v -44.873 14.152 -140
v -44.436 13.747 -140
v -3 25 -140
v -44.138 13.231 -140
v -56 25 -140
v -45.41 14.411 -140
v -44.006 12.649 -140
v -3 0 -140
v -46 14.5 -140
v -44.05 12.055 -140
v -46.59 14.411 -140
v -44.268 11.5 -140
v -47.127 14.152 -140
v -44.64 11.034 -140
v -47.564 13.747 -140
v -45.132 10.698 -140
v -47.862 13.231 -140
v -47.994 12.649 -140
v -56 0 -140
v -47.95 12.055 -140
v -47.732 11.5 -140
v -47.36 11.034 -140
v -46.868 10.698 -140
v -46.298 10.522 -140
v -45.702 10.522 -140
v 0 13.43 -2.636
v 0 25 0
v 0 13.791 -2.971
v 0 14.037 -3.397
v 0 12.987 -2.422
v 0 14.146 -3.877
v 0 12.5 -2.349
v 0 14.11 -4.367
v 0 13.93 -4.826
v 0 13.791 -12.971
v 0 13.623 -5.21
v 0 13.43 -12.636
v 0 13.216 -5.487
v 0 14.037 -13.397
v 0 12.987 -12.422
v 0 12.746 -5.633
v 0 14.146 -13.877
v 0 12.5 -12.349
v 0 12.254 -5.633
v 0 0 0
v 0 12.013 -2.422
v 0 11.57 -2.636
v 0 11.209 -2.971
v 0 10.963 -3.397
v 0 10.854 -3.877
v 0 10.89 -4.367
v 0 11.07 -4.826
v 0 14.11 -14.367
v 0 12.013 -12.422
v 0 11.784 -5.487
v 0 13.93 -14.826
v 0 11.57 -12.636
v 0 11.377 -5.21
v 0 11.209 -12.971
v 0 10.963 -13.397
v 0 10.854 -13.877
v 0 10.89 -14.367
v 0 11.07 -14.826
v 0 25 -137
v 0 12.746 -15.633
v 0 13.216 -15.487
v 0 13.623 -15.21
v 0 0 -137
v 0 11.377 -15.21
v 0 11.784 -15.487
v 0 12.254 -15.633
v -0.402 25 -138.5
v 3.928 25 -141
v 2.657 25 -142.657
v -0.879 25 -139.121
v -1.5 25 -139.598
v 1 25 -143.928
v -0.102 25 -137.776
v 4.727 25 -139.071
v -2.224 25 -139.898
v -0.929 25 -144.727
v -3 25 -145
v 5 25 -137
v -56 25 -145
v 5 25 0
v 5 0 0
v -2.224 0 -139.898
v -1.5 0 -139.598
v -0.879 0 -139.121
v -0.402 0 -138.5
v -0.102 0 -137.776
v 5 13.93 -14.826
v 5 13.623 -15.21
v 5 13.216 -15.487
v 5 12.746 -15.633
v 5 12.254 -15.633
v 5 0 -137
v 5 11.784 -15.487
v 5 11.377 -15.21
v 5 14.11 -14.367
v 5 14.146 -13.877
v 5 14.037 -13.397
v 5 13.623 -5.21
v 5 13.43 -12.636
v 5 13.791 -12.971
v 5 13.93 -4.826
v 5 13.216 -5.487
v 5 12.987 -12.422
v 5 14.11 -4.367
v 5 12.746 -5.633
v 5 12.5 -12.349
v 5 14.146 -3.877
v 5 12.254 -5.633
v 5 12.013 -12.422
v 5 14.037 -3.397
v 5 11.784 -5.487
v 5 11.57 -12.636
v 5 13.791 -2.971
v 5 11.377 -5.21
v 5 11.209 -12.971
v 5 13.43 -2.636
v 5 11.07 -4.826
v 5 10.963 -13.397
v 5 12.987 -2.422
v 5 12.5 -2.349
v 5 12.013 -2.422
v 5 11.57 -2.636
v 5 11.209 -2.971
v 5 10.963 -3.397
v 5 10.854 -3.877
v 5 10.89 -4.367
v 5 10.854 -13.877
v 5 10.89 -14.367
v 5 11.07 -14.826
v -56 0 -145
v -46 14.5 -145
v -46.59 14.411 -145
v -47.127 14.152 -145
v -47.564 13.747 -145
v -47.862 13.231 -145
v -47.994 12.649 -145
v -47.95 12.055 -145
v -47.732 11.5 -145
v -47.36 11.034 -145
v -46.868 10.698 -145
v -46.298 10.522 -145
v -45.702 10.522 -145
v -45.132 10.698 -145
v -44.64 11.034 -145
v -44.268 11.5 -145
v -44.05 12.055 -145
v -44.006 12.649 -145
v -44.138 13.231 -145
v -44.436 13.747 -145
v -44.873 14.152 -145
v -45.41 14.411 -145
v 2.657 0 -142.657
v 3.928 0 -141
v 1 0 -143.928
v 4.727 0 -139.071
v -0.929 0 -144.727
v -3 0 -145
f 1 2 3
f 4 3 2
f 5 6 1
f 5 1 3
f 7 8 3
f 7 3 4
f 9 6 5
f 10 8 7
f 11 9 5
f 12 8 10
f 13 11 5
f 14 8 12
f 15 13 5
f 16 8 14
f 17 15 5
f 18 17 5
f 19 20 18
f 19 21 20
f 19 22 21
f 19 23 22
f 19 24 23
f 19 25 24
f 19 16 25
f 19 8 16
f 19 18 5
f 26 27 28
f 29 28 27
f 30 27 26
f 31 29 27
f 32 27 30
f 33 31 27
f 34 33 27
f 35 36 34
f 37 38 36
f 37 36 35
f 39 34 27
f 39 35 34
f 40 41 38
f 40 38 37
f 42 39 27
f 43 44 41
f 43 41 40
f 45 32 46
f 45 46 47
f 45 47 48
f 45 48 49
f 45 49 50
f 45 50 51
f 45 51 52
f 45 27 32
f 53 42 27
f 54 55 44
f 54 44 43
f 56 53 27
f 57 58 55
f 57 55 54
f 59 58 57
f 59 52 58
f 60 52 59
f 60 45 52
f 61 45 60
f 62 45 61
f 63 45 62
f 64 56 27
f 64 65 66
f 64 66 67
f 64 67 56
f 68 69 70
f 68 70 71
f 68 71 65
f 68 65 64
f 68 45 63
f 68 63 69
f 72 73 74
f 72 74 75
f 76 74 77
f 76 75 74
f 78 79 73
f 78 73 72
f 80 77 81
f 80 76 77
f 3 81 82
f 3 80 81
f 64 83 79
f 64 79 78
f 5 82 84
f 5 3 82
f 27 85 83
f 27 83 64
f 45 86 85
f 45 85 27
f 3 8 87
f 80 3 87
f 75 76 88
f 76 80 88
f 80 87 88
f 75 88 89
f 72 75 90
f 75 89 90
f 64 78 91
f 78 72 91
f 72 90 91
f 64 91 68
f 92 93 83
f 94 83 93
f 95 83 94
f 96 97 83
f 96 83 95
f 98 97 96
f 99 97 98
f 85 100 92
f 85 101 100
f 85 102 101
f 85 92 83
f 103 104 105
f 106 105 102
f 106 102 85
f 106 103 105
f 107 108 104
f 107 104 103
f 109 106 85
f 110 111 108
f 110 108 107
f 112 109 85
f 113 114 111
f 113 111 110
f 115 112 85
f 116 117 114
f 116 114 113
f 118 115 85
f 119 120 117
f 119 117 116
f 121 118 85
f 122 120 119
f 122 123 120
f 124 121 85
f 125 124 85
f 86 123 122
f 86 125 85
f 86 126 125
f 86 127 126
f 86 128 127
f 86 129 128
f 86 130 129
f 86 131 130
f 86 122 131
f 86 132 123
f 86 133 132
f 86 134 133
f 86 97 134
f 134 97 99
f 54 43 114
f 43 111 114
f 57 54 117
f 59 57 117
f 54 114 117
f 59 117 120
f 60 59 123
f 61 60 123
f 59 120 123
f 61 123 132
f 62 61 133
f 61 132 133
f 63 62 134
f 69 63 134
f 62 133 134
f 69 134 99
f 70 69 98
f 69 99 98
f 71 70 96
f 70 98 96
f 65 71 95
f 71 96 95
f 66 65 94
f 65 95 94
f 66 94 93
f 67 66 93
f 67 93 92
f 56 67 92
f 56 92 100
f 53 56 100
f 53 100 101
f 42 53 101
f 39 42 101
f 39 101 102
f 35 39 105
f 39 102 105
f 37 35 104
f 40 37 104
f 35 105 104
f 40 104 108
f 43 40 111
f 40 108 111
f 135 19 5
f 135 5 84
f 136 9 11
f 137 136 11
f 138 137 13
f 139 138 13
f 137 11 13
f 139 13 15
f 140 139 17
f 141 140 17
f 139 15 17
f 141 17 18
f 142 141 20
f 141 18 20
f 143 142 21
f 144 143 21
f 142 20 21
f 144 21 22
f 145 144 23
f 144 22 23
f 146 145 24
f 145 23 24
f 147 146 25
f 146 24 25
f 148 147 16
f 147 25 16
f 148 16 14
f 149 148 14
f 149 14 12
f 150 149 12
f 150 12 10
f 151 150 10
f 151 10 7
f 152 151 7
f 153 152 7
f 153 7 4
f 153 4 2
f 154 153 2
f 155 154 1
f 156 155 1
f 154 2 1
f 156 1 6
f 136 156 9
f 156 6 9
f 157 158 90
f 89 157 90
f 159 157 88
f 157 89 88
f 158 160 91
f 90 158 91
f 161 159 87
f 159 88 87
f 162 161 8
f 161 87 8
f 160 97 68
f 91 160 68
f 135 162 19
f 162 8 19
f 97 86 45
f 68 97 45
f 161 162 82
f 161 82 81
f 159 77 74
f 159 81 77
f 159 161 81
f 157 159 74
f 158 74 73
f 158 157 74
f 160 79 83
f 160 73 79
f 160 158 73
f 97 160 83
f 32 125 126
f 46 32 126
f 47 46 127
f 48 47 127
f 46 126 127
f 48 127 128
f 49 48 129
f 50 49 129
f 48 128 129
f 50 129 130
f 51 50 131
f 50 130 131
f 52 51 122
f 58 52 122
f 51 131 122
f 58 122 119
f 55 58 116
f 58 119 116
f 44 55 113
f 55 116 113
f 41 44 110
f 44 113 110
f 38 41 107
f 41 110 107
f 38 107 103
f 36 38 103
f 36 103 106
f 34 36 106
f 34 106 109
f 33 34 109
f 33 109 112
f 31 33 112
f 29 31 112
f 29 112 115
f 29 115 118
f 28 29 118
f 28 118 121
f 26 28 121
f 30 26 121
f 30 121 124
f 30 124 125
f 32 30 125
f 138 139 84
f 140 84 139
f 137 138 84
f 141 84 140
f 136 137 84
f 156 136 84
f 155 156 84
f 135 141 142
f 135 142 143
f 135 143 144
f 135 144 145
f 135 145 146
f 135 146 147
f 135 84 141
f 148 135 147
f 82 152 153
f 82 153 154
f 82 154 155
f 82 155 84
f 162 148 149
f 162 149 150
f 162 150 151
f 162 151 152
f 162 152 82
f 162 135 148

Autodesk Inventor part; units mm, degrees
ref_plane "YZ Plane" through (0, 0, 0) normal (1, 0, 0) x (0, 1, 0)
ref_plane "XZ Plane" through (0, 0, 0) normal (0, 1, 0) x (-1, 0, 0)
ref_plane "XY Plane" through (0, 0, 0) normal (0, 0, 1) x (1, 0, 0)
sketch "Sketch1" plane through (0, 0, 0) normal (0, 1, 0) x (-1, 0, 0)
  line L0 (0, 0) -> (0, -137)
  line L1 (3, -140) -> (56, -140)
  arc A0 (0, -137) -> (3, -140) centre (3, -137) ccw
  line L2 (56, -145) -> (3, -145)
  arc A1 (-5, -137) -> (3, -145) centre (3, -137) ccw
  line L3 (-5, -137) -> (-5, 0)
  line L4 (56, -140) -> (56, -145)
  line L5 (-5, 0) -> (0, 0)
  point P0 (0, -140)
  dimension "d0" = 140
  dimension "d1" = 56
  dimension "d2" = 3
  dimension "d3" = 5
extrude "Extrusion1" add sketch "Sketch1" along normal blind 25
sketch "Sketch2" plane through (-3, 0, -145) normal (0, 0, -1) x (-1, 0, 0)
  line L0 (53, 0) -> (0, 0) projected
  line L1 (53, 0) -> (53, 25) projected
  line L2 (0, 25) -> (53, 25) projected
  line L3 (0, 0) -> (0, 25) projected
  circle A0 centre (43, 12.5) radius 2
  point P0 (-3, 0)
  dimension "d6" = 4
  dimension "d7" = 12.5
  dimension "d8" = 10
hole "Hole1" at (-46, 12.5, -145) direction (0, 0, 1) diameter 4 end through all
sketch "Sketch3" plane through (0, 0, -137) normal (-1, 0, 0) x (0, 0, 1)
  line L0 (137, 0) -> (0, 0) projected
  line L1 (137, 0) -> (137, 25) projected
  line L2 (0, 25) -> (137, 25) projected
  line L3 (0, 0) -> (0, 25) projected
  circle A0 centre (123, 12.5) radius 2
  circle A1 centre (133, 12.5) radius 2
  dimension "d16" = 4
  dimension "d17" = 4
  dimension "d18" = 4
  dimension "d19" = 14
  dimension "d20" = 12.5
  dimension "d21" = 12.5
hole "Hole2" at (0, 12.5, -14) at (0, 12.5, -4) direction (1, 0, 0) diameter 3.302 end through all
properties part number "Brazo"
